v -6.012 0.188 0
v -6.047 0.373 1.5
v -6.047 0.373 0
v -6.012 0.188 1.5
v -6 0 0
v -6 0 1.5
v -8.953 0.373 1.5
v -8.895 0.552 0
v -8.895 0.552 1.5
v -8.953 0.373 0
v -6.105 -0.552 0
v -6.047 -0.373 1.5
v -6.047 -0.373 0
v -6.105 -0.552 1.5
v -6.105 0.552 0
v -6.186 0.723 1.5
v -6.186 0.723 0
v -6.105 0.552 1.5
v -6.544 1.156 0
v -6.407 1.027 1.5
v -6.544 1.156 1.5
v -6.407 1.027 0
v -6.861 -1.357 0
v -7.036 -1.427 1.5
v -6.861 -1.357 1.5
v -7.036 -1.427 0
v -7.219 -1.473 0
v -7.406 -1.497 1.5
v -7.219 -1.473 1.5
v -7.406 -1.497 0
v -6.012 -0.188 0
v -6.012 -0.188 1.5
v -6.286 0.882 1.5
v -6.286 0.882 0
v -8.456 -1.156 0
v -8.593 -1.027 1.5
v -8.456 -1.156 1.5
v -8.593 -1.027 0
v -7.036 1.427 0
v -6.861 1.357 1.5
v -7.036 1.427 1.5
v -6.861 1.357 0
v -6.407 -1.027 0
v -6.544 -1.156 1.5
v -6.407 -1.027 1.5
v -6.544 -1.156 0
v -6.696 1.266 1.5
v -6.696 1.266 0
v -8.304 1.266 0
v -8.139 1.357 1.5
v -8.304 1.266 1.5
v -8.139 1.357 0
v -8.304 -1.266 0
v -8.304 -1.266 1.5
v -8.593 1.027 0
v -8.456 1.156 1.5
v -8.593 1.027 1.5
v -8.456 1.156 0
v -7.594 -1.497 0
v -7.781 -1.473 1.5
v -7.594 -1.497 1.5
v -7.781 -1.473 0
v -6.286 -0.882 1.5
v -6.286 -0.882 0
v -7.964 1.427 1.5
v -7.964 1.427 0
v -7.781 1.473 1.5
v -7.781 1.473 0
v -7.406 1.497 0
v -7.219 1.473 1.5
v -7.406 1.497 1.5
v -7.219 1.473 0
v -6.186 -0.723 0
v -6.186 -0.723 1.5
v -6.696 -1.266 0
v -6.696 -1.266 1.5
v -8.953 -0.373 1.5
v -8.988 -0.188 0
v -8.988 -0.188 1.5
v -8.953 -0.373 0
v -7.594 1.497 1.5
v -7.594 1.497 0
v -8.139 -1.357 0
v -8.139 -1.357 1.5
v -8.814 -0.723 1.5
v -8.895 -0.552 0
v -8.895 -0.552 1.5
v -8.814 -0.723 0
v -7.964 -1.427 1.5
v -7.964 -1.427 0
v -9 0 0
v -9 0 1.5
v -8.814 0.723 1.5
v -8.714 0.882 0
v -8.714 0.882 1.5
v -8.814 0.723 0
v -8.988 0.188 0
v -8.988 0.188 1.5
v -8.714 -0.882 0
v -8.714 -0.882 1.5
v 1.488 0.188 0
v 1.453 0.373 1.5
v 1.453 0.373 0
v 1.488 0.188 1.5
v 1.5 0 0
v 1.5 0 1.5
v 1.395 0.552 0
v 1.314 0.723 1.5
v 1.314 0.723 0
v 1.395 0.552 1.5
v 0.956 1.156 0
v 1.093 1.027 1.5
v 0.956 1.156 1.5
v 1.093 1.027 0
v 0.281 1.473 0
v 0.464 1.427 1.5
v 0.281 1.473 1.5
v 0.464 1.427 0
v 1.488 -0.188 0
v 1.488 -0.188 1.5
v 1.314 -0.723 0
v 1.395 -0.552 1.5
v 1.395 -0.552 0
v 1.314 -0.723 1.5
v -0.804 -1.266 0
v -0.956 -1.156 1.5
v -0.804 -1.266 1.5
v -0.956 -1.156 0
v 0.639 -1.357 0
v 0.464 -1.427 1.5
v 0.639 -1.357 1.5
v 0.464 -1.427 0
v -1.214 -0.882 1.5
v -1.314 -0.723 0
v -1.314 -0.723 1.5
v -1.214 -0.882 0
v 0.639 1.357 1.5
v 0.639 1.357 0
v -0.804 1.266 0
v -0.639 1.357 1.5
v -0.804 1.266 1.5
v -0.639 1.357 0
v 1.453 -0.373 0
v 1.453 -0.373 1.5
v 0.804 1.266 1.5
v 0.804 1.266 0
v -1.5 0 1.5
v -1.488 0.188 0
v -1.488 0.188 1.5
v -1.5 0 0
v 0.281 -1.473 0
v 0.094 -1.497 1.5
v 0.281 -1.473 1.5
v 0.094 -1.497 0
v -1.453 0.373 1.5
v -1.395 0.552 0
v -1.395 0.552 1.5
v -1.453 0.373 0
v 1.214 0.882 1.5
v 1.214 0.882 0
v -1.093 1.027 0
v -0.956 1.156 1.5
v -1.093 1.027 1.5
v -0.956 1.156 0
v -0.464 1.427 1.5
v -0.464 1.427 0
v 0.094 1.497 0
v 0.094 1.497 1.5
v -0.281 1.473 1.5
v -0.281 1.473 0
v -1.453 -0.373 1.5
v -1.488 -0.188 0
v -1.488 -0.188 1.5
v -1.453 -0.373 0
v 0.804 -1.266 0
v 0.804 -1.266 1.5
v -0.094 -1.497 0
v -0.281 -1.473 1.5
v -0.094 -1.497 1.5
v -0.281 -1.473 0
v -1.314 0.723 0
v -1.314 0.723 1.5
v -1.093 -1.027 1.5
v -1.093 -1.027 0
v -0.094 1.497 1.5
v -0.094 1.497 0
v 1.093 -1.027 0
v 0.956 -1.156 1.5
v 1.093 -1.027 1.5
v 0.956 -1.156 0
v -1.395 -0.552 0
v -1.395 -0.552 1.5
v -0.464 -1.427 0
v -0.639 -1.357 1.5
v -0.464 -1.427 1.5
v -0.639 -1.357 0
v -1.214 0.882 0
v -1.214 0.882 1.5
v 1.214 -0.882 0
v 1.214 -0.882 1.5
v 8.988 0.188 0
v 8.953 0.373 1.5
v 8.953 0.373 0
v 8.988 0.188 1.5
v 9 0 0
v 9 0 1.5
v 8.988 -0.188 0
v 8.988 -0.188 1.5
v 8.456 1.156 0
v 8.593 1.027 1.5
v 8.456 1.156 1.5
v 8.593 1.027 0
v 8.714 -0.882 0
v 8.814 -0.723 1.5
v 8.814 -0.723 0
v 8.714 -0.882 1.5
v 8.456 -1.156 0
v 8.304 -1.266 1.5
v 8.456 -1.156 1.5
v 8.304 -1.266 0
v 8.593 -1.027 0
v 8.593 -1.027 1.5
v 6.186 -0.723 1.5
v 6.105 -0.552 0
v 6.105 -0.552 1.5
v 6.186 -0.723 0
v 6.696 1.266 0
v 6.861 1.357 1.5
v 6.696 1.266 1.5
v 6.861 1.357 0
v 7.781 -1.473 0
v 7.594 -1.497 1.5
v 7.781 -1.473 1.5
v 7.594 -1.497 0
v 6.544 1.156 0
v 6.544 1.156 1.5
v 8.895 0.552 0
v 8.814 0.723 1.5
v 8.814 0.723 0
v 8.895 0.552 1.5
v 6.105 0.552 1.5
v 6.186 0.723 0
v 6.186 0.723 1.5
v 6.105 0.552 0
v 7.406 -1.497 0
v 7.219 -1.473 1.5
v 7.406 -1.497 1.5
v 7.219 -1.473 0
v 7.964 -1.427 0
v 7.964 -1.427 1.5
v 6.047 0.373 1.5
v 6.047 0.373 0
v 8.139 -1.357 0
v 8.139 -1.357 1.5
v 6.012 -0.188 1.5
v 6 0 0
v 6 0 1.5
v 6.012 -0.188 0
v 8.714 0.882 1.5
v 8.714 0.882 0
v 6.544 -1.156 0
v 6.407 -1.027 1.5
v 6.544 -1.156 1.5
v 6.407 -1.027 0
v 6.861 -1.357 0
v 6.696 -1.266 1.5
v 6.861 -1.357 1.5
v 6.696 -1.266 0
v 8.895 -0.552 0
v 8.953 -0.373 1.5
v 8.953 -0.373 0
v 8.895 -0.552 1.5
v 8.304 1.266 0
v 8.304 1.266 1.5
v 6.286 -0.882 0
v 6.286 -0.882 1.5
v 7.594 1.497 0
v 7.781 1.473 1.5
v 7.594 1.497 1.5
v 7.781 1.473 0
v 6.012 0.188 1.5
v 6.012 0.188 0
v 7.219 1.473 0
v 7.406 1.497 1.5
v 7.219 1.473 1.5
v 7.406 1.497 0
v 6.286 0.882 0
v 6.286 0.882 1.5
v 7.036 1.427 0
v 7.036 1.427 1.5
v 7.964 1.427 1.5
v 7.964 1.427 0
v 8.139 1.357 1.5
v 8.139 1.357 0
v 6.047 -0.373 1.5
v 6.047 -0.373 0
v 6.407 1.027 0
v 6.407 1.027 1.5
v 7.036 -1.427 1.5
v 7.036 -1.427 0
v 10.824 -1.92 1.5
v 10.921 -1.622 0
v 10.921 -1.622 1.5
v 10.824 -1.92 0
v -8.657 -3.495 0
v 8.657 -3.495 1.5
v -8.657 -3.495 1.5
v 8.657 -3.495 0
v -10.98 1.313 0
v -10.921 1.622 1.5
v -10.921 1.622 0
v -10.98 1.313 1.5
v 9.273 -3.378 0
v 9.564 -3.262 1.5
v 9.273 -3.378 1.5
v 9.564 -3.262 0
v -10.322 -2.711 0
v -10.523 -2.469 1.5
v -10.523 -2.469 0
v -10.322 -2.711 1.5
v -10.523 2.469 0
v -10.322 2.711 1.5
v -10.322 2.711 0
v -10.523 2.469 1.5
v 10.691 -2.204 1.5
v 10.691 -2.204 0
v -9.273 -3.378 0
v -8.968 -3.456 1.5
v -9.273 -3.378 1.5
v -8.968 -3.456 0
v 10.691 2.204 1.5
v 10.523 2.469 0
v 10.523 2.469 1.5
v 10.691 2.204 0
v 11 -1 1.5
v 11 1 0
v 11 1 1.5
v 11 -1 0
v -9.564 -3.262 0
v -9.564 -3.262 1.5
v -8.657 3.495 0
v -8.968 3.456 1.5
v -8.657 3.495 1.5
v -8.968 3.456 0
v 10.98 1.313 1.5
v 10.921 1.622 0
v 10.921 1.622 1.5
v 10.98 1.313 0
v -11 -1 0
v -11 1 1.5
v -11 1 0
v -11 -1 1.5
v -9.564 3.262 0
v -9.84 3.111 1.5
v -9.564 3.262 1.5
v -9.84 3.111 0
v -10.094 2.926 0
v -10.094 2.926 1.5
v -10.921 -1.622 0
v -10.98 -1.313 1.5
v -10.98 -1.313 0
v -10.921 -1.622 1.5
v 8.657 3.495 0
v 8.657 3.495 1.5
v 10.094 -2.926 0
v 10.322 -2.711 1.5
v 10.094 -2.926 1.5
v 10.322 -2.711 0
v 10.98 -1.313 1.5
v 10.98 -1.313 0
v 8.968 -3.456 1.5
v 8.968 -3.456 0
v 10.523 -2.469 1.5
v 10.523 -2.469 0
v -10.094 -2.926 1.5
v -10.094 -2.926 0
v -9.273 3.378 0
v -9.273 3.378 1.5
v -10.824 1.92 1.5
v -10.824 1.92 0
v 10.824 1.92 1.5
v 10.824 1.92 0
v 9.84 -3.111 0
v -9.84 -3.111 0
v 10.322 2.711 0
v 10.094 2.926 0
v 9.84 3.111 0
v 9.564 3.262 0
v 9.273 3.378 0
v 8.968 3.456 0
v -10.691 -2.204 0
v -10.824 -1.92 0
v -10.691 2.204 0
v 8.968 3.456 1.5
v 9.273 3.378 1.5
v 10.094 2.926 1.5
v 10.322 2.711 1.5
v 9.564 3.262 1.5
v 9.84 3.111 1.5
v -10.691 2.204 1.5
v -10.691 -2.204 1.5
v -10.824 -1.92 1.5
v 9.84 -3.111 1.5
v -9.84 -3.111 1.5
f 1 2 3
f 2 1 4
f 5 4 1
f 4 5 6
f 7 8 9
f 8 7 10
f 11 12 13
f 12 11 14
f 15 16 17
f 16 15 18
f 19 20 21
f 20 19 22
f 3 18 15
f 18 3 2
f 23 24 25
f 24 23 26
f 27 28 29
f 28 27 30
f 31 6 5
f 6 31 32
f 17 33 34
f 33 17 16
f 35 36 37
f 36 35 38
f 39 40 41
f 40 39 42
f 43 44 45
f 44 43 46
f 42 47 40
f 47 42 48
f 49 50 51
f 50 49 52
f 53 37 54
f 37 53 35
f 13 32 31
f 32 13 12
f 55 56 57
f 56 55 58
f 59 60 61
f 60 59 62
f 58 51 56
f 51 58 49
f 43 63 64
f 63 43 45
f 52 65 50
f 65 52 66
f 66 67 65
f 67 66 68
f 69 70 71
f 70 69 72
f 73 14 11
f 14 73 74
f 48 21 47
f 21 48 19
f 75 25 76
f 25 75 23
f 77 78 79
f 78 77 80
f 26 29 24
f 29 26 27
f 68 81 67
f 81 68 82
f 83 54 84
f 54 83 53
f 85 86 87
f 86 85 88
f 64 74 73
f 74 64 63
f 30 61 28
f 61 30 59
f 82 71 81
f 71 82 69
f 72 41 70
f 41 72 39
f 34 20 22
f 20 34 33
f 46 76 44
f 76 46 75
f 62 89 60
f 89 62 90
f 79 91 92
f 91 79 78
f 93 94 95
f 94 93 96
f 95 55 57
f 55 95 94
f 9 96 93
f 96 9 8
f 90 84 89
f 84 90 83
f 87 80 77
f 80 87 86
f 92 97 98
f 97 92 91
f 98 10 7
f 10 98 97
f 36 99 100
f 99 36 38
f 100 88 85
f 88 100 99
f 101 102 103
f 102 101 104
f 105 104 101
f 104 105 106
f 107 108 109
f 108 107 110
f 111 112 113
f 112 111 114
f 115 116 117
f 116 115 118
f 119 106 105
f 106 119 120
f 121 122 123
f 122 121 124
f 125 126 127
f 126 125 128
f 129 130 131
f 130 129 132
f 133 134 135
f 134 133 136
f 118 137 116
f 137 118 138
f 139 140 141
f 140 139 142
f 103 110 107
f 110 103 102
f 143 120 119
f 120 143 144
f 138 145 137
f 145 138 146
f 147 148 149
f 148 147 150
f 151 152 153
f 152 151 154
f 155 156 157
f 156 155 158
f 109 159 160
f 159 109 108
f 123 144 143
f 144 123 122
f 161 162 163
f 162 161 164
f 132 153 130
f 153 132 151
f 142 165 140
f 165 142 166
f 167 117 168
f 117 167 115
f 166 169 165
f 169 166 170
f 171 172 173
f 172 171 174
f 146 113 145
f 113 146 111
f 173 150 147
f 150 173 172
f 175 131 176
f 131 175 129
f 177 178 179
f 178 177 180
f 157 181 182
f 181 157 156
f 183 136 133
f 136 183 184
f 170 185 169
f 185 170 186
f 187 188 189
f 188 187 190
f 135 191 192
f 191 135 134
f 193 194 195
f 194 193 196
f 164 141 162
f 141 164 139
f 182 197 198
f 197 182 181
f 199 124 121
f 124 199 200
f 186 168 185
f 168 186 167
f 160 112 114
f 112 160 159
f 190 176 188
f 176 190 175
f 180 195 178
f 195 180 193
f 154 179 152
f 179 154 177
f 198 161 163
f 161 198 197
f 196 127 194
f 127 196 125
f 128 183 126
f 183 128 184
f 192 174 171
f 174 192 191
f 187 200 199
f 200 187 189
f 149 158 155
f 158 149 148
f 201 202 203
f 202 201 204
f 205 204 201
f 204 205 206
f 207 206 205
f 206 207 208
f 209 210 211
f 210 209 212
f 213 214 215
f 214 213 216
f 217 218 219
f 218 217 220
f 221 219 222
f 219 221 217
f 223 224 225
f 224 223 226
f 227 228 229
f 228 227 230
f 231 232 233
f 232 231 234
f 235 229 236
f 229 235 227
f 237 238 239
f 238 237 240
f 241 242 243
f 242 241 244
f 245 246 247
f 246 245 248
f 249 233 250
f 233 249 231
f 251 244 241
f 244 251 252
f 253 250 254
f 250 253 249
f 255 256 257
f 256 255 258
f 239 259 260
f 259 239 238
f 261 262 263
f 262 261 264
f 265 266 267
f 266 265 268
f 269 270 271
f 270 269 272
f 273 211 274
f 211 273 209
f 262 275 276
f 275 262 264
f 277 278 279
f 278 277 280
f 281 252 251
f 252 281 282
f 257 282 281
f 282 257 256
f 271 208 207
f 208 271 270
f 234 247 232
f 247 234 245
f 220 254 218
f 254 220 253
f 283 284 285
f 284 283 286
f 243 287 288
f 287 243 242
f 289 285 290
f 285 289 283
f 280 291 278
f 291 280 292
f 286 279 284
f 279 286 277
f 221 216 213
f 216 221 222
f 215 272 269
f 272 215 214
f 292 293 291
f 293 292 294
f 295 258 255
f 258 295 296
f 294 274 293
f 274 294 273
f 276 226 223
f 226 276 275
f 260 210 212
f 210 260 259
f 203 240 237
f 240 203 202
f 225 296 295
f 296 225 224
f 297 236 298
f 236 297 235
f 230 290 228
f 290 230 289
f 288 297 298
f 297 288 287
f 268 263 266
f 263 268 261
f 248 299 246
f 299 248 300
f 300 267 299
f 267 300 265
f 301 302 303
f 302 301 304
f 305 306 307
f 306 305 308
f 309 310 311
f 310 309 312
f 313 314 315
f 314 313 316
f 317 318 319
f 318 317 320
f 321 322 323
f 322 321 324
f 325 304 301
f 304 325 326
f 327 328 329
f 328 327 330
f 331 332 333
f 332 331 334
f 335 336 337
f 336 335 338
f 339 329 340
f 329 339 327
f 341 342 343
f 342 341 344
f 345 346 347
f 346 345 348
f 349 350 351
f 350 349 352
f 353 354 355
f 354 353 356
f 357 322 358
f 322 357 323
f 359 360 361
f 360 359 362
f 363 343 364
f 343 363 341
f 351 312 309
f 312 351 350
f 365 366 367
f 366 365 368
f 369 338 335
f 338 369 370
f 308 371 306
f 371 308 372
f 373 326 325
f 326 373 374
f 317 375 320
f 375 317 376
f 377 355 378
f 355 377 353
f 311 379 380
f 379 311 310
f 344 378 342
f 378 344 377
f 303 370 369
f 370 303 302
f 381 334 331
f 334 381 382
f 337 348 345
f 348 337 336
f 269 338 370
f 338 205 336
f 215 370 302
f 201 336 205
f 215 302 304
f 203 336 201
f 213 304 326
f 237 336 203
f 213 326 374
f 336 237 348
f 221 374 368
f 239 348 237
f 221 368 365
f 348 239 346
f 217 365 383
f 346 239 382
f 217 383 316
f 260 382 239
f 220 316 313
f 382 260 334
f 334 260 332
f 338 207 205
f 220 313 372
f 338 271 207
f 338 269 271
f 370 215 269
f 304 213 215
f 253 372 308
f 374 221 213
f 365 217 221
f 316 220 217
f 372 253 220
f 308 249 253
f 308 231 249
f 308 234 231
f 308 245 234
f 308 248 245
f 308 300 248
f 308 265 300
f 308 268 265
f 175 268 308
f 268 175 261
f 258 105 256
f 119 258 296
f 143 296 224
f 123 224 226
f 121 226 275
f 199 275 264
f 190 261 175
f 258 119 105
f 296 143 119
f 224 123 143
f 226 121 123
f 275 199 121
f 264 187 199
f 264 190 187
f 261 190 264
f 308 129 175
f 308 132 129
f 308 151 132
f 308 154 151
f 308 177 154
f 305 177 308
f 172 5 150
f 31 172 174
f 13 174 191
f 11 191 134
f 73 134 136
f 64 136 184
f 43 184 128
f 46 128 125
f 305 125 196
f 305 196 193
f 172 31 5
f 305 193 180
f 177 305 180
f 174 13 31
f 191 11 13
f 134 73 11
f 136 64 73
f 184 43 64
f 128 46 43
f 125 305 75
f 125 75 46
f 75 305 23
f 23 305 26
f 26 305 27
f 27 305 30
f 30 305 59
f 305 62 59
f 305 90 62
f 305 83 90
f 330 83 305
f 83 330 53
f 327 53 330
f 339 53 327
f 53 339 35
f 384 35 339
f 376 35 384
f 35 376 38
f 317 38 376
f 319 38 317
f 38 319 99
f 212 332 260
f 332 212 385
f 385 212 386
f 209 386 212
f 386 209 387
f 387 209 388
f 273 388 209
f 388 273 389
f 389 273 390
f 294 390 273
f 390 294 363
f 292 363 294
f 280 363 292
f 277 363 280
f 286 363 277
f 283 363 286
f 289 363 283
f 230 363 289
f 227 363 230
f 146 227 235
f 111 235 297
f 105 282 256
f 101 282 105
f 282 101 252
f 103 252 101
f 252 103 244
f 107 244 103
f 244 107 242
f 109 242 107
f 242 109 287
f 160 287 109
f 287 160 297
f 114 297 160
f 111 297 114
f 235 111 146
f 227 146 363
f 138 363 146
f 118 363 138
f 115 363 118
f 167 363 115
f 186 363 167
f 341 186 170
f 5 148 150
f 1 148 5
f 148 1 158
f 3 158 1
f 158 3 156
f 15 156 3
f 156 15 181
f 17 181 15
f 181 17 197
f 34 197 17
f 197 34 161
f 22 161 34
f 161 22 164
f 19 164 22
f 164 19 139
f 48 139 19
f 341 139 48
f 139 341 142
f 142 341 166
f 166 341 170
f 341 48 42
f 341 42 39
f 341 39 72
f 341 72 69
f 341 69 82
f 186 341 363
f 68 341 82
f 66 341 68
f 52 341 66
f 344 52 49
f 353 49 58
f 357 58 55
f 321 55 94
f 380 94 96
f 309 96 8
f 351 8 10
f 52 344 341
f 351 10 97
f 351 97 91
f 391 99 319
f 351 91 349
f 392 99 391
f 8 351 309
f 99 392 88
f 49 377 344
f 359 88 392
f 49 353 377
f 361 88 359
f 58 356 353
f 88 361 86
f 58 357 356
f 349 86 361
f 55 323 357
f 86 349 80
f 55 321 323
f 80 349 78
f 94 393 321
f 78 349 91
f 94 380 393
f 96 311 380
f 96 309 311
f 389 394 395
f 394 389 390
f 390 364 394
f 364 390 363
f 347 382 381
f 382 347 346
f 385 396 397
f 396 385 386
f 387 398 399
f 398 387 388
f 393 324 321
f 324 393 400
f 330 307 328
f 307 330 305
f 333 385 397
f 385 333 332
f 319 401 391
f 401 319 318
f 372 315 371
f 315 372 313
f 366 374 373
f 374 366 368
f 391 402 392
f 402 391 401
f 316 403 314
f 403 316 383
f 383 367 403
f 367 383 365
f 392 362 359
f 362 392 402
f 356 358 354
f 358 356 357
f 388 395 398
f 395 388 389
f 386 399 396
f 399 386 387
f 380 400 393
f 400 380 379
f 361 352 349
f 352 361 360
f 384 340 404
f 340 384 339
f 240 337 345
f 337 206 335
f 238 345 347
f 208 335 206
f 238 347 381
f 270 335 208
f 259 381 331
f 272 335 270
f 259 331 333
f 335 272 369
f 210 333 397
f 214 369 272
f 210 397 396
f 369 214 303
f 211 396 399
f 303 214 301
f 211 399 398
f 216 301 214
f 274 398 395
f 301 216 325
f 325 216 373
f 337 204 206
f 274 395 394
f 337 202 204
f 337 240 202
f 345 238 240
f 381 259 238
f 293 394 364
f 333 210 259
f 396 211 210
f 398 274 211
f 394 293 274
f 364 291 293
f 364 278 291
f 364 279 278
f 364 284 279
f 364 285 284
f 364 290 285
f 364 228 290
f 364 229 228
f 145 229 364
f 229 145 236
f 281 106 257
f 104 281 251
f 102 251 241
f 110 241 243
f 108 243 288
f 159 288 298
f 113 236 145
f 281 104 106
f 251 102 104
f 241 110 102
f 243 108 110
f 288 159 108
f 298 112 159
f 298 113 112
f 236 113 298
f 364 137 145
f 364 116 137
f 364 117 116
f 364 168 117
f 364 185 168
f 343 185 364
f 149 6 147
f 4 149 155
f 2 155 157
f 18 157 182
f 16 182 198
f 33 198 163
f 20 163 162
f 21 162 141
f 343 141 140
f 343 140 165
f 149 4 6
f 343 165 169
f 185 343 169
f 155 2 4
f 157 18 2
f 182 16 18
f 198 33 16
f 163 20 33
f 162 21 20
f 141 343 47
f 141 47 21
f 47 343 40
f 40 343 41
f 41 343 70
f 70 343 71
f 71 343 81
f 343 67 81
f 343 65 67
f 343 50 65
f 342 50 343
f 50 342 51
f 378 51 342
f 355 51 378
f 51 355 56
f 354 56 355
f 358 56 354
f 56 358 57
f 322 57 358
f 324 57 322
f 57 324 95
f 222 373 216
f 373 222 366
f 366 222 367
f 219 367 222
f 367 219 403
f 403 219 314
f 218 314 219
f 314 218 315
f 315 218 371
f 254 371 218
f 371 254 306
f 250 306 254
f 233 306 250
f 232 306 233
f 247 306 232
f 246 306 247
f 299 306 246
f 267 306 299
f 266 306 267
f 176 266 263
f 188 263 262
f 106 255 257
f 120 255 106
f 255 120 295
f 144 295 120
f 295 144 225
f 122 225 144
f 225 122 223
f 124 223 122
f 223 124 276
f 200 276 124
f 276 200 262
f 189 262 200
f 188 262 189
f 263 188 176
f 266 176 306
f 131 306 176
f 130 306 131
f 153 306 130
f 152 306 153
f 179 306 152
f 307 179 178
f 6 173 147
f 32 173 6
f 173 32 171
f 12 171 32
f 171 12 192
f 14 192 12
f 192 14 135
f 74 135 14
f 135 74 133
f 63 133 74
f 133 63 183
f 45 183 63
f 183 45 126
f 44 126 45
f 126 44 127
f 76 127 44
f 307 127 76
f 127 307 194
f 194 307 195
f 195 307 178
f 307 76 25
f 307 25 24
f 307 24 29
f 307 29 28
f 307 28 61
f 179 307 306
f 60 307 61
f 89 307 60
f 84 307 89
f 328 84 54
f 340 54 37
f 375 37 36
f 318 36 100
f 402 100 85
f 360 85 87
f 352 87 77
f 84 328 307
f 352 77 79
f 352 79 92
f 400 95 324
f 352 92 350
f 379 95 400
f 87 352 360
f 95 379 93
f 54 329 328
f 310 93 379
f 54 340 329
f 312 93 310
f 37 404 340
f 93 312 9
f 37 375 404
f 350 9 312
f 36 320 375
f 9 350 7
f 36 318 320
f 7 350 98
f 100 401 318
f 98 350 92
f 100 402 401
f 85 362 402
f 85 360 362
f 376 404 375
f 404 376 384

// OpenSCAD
$fn = 50;


difference() {
	union() {
		translate(v = [0, 0, 0]) {
			rotate(a = [0, 0, 0]) {
				hull() {
					translate(v = [-8.5000000000, 1.0000000000, 0]) {
						rotate(a = [0, 0, 0]) {
							translate(v = [0, 0, 0]) {
								rotate(a = [0, 0, 0]) {
									cylinder(h = 1.5000000000, r = 2.5000000000);
								}
							}
						}
					}
					translate(v = [8.5000000000, 1.0000000000, 0]) {
						rotate(a = [0, 0, 0]) {
							translate(v = [0, 0, 0]) {
								rotate(a = [0, 0, 0]) {
									cylinder(h = 1.5000000000, r = 2.5000000000);
								}
							}
						}
					}
					translate(v = [-8.5000000000, -1.0000000000, 0]) {
						rotate(a = [0, 0, 0]) {
							translate(v = [0, 0, 0]) {
								rotate(a = [0, 0, 0]) {
									cylinder(h = 1.5000000000, r = 2.5000000000);
								}
							}
						}
					}
					translate(v = [8.5000000000, -1.0000000000, 0]) {
						rotate(a = [0, 0, 0]) {
							translate(v = [0, 0, 0]) {
								rotate(a = [0, 0, 0]) {
									cylinder(h = 1.5000000000, r = 2.5000000000);
								}
							}
						}
					}
				}
			}
		}
	}
	union() {
		translate(v = [-7.5000000000, 0.0000000000, 0]) {
			rotate(a = [0, 0, 0]) {
				translate(v = [0, 0, -50]) {
					rotate(a = [0, 0, 0]) {
						cylinder(h = 100, r = 1.5000000000);
					}
				}
			}
		}
		translate(v = [0.0000000000, 0.0000000000, 0]) {
			rotate(a = [0, 0, 0]) {
				translate(v = [0, 0, -50]) {
					rotate(a = [0, 0, 0]) {
						cylinder(h = 100, r = 1.5000000000);
					}
				}
			}
		}
		translate(v = [7.5000000000, 0.0000000000, 0]) {
			rotate(a = [0, 0, 0]) {
				translate(v = [0, 0, -50]) {
					rotate(a = [0, 0, 0]) {
						cylinder(h = 100, r = 1.5000000000);
					}
				}
			}
		}
	}
}
